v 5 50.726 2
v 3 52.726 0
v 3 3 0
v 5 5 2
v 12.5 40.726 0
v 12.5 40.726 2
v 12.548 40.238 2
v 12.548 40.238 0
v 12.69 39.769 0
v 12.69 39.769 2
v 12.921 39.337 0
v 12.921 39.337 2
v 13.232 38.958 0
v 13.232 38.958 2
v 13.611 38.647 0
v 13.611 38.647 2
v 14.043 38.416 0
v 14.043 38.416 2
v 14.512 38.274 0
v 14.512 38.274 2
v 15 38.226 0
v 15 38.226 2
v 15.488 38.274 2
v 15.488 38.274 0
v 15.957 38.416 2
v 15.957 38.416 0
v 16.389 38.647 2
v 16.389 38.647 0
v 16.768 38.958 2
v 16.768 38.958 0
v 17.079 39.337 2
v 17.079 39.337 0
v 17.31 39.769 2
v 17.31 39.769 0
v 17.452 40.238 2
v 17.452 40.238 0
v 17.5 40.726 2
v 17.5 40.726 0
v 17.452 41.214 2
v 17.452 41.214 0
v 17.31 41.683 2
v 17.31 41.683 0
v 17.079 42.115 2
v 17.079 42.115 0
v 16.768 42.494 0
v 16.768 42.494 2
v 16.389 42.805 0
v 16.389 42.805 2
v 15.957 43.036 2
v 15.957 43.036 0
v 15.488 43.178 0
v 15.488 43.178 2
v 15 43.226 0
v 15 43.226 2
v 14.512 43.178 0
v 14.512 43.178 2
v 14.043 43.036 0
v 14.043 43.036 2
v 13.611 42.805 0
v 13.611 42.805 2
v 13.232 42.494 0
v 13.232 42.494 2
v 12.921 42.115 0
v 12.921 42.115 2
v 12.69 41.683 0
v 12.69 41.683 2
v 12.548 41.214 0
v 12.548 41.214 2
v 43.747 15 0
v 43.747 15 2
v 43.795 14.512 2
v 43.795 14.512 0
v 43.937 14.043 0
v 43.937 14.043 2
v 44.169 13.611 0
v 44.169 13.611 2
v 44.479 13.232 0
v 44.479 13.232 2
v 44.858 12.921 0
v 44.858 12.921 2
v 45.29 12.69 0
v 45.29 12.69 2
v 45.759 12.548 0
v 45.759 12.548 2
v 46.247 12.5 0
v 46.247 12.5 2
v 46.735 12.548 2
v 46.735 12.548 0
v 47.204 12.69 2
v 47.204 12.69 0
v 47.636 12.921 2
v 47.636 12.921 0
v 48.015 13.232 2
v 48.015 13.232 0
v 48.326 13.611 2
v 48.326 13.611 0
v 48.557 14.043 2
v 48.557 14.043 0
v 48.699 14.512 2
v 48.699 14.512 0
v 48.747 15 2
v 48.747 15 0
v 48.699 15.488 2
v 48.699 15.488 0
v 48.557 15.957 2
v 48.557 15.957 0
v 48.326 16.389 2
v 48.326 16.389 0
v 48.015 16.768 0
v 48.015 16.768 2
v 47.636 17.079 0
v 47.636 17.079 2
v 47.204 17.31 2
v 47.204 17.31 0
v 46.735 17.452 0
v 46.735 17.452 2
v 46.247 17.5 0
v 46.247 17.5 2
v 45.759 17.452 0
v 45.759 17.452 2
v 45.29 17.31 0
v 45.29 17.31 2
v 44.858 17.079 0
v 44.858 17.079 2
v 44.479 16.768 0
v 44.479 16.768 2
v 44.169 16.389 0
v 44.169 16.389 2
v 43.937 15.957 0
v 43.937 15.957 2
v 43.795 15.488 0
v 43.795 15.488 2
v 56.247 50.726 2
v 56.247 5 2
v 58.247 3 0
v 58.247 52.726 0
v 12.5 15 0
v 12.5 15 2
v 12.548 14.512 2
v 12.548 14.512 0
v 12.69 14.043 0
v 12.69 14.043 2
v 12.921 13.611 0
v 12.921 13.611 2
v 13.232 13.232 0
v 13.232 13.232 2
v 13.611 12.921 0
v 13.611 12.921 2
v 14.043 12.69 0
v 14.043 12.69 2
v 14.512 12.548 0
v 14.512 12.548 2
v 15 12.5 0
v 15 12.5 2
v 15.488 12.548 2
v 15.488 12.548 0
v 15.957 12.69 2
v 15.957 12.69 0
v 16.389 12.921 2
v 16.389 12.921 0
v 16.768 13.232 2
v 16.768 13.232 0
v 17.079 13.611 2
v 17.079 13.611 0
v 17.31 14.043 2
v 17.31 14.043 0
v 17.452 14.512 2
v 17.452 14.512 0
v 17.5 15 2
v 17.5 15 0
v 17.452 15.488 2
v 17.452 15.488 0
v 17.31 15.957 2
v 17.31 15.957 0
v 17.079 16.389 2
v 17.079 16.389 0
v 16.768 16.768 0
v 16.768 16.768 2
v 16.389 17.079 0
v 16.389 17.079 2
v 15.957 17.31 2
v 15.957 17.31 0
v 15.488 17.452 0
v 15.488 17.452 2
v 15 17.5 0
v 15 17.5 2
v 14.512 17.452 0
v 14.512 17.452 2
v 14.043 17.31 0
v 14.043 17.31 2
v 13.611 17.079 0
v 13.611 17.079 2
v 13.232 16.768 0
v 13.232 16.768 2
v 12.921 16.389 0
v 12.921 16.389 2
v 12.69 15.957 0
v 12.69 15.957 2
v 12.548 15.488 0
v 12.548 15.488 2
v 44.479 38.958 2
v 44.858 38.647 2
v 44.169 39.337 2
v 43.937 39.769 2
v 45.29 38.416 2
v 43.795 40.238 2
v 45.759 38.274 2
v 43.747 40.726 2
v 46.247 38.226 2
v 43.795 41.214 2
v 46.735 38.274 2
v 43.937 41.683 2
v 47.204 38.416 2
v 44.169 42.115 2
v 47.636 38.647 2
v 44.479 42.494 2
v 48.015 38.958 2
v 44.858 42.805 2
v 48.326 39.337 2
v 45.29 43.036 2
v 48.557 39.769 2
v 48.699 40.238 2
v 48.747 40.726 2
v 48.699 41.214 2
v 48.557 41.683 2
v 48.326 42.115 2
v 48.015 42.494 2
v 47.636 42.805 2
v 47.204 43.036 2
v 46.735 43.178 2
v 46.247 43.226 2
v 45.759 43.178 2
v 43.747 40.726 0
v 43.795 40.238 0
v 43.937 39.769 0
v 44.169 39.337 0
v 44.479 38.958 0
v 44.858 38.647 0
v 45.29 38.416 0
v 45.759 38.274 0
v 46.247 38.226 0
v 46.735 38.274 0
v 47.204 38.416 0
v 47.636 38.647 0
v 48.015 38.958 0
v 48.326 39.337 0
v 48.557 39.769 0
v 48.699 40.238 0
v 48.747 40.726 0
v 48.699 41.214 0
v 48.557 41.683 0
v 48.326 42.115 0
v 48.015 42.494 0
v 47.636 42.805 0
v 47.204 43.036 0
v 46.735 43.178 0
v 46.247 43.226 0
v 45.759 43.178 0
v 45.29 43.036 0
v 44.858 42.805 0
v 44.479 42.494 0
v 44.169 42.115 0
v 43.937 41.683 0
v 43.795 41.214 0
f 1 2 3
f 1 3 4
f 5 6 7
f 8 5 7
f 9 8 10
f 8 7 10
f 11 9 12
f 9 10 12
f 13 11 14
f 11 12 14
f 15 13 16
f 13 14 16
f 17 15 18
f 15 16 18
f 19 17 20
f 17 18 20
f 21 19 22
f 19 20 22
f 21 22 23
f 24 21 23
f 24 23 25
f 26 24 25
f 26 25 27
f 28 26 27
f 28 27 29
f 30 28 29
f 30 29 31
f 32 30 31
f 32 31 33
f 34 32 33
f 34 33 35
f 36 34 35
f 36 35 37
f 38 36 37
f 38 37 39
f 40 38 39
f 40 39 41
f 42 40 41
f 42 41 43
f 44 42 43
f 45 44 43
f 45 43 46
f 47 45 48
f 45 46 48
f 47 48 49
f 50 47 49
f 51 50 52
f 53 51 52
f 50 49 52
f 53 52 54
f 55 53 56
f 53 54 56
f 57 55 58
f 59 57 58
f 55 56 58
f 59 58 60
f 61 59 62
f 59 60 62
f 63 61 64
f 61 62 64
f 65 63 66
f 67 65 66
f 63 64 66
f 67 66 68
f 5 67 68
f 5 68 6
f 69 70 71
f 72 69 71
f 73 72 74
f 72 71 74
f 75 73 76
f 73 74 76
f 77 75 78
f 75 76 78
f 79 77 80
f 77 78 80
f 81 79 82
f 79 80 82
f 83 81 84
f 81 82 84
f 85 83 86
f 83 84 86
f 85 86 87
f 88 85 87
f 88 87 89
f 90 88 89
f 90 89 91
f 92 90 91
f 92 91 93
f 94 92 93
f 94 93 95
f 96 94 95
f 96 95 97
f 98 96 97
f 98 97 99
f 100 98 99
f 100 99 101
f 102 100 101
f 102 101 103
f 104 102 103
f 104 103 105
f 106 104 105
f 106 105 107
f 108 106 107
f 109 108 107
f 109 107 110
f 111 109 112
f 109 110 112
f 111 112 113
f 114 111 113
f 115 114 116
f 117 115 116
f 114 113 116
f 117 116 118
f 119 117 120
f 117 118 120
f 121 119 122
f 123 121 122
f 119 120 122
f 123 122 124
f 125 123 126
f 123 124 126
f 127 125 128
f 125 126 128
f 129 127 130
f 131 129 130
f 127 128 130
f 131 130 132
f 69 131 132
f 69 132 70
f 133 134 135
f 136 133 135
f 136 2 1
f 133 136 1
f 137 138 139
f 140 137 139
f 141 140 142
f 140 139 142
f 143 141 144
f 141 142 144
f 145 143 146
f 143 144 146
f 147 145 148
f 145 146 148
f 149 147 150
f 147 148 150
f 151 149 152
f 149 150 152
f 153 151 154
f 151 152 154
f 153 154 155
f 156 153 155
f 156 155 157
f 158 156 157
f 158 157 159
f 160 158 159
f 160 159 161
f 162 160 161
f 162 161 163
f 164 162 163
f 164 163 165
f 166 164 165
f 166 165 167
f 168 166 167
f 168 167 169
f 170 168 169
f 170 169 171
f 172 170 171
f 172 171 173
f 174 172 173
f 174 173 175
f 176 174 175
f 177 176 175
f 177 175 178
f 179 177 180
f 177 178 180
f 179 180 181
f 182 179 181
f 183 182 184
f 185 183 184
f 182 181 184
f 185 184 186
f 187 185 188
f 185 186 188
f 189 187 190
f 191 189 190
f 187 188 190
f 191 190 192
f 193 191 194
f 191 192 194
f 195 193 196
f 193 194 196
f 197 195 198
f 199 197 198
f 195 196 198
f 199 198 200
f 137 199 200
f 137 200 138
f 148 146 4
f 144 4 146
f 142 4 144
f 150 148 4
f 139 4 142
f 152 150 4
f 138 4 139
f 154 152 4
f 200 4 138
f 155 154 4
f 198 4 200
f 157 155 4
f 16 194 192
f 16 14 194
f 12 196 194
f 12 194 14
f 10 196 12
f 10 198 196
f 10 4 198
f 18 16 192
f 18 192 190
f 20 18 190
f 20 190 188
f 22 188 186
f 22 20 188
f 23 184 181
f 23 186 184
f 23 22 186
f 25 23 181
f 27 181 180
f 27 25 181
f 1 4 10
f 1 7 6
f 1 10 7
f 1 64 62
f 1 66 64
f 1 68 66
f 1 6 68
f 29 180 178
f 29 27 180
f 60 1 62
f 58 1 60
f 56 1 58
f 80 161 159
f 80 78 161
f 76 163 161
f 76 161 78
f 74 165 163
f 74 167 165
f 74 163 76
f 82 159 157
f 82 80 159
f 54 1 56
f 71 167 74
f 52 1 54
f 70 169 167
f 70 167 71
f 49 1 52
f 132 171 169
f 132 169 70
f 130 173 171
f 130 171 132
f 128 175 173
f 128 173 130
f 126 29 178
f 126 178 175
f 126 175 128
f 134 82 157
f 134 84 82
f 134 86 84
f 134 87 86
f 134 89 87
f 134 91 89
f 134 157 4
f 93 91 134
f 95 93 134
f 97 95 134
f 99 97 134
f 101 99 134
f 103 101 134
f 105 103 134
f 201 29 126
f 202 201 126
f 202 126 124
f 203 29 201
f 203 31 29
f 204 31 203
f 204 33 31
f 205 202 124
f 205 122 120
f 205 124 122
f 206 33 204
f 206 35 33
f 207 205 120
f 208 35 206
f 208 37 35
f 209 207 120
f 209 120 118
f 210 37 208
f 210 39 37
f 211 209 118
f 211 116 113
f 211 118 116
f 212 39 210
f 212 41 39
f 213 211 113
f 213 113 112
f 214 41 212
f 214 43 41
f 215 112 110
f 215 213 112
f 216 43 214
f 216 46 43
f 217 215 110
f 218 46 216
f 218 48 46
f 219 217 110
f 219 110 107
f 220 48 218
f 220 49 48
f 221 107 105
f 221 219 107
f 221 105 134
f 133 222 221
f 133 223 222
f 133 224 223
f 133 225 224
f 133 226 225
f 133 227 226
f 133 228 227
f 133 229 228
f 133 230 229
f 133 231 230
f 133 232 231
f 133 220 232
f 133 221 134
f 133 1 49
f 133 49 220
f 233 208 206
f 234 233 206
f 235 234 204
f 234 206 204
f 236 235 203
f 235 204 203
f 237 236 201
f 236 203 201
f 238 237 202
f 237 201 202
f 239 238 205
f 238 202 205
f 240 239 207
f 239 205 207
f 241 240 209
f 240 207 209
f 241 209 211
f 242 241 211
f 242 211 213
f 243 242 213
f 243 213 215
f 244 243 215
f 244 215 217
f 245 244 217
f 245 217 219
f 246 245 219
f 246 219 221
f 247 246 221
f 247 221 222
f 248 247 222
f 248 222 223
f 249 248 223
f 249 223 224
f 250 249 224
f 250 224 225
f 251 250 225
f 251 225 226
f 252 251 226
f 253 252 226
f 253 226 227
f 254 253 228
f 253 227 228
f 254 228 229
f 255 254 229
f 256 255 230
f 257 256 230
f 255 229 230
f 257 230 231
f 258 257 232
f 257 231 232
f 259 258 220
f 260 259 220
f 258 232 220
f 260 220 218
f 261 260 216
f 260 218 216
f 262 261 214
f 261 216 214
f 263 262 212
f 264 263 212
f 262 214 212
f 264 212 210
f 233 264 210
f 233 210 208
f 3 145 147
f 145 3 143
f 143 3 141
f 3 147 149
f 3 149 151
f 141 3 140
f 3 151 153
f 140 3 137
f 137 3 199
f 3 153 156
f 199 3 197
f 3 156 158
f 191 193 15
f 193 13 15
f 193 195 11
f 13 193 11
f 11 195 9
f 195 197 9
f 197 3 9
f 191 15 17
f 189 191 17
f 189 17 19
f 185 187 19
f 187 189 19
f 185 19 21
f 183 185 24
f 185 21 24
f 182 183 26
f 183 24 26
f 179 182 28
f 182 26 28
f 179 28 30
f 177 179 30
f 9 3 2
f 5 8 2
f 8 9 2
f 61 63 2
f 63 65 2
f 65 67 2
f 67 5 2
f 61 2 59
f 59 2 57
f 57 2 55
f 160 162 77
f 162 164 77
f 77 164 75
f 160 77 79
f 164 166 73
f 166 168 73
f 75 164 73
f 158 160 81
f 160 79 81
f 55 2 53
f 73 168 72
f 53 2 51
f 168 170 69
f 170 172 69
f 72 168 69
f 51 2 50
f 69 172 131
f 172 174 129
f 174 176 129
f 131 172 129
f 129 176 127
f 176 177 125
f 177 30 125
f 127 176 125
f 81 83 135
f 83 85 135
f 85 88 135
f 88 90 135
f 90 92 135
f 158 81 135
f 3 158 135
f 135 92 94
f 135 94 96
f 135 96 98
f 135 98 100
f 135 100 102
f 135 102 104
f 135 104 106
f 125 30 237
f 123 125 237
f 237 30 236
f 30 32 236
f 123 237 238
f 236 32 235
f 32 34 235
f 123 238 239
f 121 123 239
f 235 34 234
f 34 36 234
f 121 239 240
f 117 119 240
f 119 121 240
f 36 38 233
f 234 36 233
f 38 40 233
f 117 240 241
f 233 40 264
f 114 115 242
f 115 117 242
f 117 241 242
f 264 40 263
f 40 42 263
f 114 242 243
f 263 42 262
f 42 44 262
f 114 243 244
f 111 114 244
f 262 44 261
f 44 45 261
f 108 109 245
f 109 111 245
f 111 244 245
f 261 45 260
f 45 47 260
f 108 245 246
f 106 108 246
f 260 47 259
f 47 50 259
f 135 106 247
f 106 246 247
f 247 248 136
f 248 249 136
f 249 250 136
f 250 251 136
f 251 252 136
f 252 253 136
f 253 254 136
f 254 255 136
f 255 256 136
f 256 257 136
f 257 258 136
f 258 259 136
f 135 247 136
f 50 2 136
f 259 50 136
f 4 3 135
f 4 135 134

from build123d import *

# Parameters (mm, degrees)
F0_W        = 61.2471848726
F0_H        = 55.7258352637
F1_DEPTH    = 2
F4_D        = 5
F5_T1_DEPTH = 81.4426651434
F5_T3_DEPTH = 86.9640147523


# Not quite as in the source:
# - a fillet or chamfer that OpenCascade refuses, or shapes differently, is made with other operations: its cross-section is extruded or revolved along the edge and cut away or added


with BuildPart() as f1:
    # F0 (on Top) → F1 (new body)
    with BuildSketch(Plane.XY):
        with Locations((30.6235924363, 27.8629176319)):
            Rectangle(F0_W, F0_H)
    extrude(amount=F1_DEPTH)

    # F4 (through all)
    with Locations(Plane(origin=(0, 0, 0), x_dir=(1, 0, 0), z_dir=(0, 0, -1))):
        with Locations((15, -40.7258352637), (46.2471848726, -40.7258352637), (15, -15), (46.2471848726, -15)):
            Hole(F4_D / 2)

    # F5: chamfer of 5 on 4 edges, made by hand

    # F5_s2 → F5_t1 (cut)
    with BuildSketch(Plane.XZ.offset(-68.5842502036)):
        Polygon((0, -3), (5, 2), (0, 2), align=None)
        Polygon((56.2471848726, 2), (61.2471848726, -3), (61.2471848726, 2), align=None)
    extrude(amount=F5_T1_DEPTH, mode=Mode.SUBTRACT)

    # F5_s4 → F5_t3 (cut)
    with BuildSketch(Plane.YZ.offset(-12.8584149398)):
        Polygon((55.7258352637, -3), (50.7258352637, 2), (55.7258352637, 2), align=None)
        Polygon((0, -3), (5, 2), (0, 2), align=None)
    extrude(amount=F5_T3_DEPTH, mode=Mode.SUBTRACT)


solid = f1.part
